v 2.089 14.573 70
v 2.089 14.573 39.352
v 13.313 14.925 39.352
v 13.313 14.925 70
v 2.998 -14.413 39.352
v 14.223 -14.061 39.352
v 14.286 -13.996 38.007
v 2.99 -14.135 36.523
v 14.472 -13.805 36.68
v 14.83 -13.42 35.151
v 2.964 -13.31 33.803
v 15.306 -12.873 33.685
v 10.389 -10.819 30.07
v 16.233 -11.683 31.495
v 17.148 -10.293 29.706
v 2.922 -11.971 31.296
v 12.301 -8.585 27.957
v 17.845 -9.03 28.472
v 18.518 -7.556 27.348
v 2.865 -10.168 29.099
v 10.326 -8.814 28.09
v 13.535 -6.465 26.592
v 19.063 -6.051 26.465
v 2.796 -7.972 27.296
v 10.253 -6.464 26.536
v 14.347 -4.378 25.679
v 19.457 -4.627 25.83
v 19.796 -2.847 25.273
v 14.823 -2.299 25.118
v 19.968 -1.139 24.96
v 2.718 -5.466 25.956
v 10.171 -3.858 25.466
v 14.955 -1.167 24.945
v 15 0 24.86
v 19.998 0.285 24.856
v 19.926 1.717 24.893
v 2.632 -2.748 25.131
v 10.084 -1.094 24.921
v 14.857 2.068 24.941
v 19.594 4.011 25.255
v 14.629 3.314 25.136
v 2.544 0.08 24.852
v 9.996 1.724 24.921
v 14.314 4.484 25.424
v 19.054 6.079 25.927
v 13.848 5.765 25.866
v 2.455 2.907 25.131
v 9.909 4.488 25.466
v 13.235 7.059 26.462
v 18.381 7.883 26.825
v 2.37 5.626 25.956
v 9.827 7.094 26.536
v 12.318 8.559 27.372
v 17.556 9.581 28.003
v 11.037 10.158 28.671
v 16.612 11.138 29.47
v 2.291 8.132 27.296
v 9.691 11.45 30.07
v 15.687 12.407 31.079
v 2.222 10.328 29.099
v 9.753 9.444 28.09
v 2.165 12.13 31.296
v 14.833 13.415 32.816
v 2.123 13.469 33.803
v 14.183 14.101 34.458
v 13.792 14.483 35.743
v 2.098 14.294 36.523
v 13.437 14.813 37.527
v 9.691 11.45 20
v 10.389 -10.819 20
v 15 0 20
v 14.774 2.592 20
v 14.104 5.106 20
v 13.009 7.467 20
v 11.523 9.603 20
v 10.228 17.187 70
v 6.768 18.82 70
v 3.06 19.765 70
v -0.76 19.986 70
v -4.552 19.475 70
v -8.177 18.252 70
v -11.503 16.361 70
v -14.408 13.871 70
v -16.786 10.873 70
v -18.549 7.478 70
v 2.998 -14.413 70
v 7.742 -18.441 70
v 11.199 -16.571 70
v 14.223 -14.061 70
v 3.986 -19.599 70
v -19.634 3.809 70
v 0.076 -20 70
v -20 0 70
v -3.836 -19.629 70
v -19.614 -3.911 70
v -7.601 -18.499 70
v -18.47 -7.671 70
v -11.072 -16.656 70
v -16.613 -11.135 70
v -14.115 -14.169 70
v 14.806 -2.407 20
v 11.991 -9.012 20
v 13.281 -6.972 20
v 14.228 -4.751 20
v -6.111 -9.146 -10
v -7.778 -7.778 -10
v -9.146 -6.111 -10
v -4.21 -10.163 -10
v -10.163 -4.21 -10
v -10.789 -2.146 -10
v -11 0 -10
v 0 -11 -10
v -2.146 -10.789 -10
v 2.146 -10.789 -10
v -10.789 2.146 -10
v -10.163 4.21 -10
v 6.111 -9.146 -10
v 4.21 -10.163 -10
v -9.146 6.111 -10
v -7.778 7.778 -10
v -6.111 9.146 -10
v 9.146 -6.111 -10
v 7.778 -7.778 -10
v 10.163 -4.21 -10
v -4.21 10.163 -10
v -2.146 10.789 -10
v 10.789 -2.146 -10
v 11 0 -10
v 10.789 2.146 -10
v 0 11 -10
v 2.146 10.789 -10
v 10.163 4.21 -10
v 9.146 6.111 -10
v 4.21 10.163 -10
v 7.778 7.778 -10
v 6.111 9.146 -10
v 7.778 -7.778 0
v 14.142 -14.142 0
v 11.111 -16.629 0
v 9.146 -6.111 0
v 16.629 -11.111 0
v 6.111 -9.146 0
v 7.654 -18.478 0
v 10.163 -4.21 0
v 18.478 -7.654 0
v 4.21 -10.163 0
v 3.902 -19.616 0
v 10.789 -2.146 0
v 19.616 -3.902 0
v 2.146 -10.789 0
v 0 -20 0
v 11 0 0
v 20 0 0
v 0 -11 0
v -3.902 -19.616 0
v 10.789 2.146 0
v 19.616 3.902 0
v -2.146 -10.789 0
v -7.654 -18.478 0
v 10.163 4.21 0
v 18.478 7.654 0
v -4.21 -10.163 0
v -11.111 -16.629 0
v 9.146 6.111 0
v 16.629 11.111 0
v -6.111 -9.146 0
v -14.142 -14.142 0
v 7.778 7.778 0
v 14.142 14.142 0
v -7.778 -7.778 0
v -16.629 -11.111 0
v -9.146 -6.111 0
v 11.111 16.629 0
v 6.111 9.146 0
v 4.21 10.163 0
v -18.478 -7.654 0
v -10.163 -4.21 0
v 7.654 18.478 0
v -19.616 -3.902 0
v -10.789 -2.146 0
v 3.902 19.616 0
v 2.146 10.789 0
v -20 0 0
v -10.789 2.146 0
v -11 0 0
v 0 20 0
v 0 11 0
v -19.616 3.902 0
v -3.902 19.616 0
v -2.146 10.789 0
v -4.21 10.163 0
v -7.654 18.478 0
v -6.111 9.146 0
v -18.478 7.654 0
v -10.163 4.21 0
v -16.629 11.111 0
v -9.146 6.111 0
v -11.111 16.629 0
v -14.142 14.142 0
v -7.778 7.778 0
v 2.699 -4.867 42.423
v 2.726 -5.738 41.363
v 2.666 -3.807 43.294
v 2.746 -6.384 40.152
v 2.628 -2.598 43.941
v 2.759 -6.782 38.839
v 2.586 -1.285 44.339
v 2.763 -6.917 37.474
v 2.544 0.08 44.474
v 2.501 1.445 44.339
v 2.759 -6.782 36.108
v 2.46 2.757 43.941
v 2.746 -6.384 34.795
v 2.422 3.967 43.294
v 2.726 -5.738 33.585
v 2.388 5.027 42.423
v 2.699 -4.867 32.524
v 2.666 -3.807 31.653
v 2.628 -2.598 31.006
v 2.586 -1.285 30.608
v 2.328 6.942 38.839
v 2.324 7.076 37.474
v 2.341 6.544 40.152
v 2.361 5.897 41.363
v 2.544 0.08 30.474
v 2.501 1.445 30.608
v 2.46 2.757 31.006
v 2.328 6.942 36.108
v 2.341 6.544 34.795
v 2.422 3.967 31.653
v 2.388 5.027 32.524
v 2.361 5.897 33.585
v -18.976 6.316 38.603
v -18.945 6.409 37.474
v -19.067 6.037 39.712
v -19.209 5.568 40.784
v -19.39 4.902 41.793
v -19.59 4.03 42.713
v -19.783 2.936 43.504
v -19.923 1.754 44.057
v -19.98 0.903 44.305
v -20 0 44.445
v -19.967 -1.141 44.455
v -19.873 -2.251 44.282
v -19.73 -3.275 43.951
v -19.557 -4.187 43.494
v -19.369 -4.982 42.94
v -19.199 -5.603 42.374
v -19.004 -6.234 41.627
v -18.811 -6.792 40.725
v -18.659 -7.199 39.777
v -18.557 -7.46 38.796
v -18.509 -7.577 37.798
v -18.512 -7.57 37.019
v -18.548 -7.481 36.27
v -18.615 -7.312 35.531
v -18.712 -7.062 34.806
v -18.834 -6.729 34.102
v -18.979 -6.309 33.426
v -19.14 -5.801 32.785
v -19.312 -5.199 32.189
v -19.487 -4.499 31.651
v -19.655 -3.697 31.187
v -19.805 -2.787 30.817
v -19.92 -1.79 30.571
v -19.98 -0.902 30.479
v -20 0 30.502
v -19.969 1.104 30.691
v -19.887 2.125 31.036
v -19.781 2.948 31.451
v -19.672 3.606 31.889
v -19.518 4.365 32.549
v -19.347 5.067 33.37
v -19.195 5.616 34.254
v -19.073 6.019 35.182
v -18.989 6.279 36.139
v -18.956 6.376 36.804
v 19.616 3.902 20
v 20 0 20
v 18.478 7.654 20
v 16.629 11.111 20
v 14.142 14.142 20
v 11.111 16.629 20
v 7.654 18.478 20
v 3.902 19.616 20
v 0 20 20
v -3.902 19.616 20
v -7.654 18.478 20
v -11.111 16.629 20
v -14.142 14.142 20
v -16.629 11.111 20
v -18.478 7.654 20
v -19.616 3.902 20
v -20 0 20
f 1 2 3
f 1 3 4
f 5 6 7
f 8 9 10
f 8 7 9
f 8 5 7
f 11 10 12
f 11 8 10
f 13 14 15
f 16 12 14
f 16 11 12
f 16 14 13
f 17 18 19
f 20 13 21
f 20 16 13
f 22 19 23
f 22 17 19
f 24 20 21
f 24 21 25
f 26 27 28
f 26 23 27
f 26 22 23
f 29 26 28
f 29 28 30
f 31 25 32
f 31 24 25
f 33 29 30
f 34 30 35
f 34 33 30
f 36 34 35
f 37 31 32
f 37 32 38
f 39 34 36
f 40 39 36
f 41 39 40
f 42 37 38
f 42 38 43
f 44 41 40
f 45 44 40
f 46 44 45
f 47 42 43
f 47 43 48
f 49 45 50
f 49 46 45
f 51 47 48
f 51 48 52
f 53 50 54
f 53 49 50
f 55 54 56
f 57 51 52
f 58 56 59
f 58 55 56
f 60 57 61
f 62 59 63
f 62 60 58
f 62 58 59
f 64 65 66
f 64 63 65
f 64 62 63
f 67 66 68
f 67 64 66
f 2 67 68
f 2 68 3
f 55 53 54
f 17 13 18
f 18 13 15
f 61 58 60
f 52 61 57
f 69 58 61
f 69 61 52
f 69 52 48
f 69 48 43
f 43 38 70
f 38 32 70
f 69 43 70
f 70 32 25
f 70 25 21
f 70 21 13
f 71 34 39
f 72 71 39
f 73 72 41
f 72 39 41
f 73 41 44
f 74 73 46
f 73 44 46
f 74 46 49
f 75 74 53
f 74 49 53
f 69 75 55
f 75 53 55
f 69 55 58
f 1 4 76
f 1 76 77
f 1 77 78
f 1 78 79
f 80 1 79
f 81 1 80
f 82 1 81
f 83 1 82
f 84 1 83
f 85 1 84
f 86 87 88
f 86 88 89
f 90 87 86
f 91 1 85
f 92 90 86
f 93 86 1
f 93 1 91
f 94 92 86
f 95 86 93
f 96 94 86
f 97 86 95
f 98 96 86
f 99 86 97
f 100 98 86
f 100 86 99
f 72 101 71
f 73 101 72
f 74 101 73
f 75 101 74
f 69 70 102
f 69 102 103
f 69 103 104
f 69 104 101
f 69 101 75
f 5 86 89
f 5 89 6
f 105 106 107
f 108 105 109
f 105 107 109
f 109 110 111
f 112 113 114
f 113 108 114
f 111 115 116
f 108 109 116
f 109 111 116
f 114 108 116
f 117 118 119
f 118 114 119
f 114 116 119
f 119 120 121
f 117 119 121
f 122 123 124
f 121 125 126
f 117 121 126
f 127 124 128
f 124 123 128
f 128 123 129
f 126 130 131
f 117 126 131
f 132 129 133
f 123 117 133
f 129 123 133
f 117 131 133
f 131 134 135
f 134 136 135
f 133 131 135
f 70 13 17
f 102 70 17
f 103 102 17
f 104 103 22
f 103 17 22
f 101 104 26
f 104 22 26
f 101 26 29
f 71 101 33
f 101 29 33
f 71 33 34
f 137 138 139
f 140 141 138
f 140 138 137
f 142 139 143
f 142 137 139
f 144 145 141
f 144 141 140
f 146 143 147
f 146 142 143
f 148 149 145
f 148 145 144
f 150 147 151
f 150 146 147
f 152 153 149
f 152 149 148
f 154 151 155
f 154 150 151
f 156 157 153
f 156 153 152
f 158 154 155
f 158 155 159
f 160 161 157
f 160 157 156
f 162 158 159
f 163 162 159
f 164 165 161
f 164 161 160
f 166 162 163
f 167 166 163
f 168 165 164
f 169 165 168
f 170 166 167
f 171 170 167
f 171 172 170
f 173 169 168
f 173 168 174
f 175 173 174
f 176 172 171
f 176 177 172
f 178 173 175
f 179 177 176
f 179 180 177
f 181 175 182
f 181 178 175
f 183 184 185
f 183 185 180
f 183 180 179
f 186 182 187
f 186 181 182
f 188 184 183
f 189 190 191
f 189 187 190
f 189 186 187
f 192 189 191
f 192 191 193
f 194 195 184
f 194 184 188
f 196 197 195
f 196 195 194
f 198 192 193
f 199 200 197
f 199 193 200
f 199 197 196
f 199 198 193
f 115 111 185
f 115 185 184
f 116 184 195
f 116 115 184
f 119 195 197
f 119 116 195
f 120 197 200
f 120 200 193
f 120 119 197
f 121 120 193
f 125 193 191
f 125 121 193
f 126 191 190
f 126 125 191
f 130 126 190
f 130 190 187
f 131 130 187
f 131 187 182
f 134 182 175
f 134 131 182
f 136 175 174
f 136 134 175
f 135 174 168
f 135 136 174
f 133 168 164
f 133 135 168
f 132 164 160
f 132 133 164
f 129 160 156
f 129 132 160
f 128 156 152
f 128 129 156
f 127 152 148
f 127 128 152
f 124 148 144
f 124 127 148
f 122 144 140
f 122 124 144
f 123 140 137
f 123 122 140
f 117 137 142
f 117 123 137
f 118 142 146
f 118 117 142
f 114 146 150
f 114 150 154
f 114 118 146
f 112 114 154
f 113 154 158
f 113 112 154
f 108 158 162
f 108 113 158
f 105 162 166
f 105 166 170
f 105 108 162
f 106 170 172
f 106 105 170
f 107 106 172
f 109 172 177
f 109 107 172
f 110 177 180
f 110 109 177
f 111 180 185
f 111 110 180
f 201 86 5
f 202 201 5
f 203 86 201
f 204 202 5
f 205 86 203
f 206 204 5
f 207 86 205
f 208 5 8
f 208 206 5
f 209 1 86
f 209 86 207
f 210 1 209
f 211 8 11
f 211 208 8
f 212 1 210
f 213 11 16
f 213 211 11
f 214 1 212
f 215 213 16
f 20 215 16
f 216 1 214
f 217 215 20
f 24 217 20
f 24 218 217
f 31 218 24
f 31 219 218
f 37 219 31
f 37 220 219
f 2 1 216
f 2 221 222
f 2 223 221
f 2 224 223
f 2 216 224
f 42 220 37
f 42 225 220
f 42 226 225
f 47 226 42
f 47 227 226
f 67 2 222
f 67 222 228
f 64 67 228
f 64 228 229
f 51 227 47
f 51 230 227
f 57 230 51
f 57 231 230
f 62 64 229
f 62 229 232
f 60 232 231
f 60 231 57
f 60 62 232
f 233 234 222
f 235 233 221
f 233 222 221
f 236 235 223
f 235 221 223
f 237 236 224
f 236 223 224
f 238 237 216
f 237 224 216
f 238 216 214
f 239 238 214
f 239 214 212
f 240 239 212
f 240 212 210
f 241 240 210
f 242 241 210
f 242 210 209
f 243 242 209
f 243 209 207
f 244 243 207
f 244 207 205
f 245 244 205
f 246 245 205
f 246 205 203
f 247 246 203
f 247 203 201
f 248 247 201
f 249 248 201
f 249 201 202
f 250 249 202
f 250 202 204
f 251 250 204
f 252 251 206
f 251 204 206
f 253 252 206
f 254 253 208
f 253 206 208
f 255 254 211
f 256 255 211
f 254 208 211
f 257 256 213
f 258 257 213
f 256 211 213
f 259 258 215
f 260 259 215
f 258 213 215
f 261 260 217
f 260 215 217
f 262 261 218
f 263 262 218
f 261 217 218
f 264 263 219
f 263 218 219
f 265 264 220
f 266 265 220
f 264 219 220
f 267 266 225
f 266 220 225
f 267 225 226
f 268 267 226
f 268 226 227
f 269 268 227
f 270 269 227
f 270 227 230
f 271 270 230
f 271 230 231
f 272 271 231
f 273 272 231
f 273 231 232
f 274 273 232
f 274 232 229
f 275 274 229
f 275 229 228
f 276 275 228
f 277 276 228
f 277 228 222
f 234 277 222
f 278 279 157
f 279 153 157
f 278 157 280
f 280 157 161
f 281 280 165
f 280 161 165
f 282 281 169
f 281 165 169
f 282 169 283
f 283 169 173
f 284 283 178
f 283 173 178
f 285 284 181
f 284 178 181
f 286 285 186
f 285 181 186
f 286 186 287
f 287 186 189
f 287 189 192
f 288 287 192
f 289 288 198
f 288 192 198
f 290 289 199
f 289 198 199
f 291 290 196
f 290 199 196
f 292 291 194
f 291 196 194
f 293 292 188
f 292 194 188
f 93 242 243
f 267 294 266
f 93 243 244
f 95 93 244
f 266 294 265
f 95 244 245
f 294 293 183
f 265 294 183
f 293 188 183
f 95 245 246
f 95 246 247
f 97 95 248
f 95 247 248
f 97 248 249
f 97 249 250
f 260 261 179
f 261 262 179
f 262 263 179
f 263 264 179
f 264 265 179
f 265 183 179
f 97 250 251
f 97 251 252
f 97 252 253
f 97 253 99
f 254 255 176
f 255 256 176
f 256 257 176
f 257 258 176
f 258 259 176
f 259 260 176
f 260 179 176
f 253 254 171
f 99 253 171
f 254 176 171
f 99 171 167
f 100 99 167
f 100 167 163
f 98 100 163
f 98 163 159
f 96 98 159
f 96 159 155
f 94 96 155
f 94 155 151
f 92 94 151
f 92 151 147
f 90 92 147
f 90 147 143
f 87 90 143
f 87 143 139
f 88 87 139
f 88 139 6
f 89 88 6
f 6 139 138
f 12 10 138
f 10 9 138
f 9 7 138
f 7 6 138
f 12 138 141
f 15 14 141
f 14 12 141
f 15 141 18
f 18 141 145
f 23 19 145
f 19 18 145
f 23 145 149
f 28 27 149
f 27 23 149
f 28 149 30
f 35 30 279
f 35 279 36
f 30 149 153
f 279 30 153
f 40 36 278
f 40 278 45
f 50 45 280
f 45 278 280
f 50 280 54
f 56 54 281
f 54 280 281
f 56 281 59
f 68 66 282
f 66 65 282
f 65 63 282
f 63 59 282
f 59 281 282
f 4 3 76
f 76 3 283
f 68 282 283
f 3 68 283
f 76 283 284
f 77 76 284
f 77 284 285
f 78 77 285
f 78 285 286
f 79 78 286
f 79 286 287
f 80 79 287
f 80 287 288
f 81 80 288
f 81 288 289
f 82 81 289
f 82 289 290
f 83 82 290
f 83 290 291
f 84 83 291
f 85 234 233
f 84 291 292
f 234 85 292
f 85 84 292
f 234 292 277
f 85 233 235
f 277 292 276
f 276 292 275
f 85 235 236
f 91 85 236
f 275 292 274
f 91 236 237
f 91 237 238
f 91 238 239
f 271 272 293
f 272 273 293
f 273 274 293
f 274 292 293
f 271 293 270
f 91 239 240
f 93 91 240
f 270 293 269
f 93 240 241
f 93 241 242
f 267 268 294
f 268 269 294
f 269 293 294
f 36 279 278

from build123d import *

# Parameters (mm, degrees)
BOSS_EXTRUDE1_START = -10
SKETCH2_R           = 20
BOSS_EXTRUDE1_DEPTH = 30
SKETCH5_R           = 20
SKETCH5_R_2         = 11
CUT_EXTRUDE1_DEPTH  = 10
SKETCH7_R           = 20
BOSS_EXTRUDE2_DEPTH = 50
CUT_EXTRUDE2_DEPTH  = 50
CUT_EXTRUDE3_START  = -7.5
CUT_EXTRUDE3_DEPTH  = 87.335902125
SKETCH10_R          = 7
CUT_EXTRUDE4_DEPTH  = 77.23263398


with BuildPart() as part:
    # Sketch2 → Boss-Extrude1 (new body)
    with BuildSketch(Plane.XY.offset(BOSS_EXTRUDE1_START)):
        Circle(SKETCH2_R)
    extrude(amount=BOSS_EXTRUDE1_DEPTH)

    # Sketch5 → Cut-Extrude1 (cut)
    with BuildSketch(Plane(origin=(0, 0, -10), x_dir=(-1, 0, 0), z_dir=(0, 0, -1))):
        Circle(SKETCH5_R)
        Circle(SKETCH5_R_2, mode=Mode.SUBTRACT)
    extrude(amount=-CUT_EXTRUDE1_DEPTH, mode=Mode.SUBTRACT)

    # Sketch7 → Boss-Extrude2 (add)
    with BuildSketch(Plane.XY.offset(20)):
        with Locations(Location((0, 0, 0), (0, 0, 180))):
            Circle(SKETCH7_R)
    extrude(amount=BOSS_EXTRUDE2_DEPTH)

    # Sketch8 → Cut-Extrude2 (cut)
    with BuildSketch(Plane.XY.offset(70)):
        with BuildLine():
            ThreePointArc((15, 0), (13.608051098, 6.310383928), (9.690540625, 11.449603591))
            Line((9.690540625, 11.449603591), (10.389343078, -10.819498621))
            ThreePointArc((10.389343078, -10.819498621), (13.799277991, -5.880469957), (15, 0))
        make_face()
    extrude(amount=-CUT_EXTRUDE2_DEPTH, mode=Mode.SUBTRACT)

    # Sketch9 → Cut-Extrude3 (cut, through all)
    with BuildSketch(Plane(origin=(10.039941851, 0.315052485, 0), x_dir=(0, 0, -1), z_dir=(0.9995080138957542, 0.03136447286604987, 0)).offset(CUT_EXTRUDE3_START)):
        with BuildLine():
            Line((-39.352049218, 14.5), (-72.599055299, 14.5))
            Line((-72.599055299, 14.5), (-72.599055299, -14.5))
            Line((-72.599055299, -14.5), (-39.352049218, -14.5))
            ThreePointArc((-39.352049218, -14.5), (-24.852049218, 0), (-39.352049218, 14.5))
        make_face()
    extrude(amount=CUT_EXTRUDE3_DEPTH, mode=Mode.SUBTRACT)

    # Sketch10 → Cut-Extrude4 (cut, through all)
    with BuildSketch(Plane(origin=(2.543631747, 0.079818939, 0), x_dir=(0, 0, -1), z_dir=(0.9995080138957542, 0.03136447286604988, 0))):
        with Locations(Location((-37.473518474, 0, 0), (0, 0, 90))):
            Circle(SKETCH10_R)
    extrude(amount=-CUT_EXTRUDE4_DEPTH, mode=Mode.SUBTRACT)


solid = part.part
